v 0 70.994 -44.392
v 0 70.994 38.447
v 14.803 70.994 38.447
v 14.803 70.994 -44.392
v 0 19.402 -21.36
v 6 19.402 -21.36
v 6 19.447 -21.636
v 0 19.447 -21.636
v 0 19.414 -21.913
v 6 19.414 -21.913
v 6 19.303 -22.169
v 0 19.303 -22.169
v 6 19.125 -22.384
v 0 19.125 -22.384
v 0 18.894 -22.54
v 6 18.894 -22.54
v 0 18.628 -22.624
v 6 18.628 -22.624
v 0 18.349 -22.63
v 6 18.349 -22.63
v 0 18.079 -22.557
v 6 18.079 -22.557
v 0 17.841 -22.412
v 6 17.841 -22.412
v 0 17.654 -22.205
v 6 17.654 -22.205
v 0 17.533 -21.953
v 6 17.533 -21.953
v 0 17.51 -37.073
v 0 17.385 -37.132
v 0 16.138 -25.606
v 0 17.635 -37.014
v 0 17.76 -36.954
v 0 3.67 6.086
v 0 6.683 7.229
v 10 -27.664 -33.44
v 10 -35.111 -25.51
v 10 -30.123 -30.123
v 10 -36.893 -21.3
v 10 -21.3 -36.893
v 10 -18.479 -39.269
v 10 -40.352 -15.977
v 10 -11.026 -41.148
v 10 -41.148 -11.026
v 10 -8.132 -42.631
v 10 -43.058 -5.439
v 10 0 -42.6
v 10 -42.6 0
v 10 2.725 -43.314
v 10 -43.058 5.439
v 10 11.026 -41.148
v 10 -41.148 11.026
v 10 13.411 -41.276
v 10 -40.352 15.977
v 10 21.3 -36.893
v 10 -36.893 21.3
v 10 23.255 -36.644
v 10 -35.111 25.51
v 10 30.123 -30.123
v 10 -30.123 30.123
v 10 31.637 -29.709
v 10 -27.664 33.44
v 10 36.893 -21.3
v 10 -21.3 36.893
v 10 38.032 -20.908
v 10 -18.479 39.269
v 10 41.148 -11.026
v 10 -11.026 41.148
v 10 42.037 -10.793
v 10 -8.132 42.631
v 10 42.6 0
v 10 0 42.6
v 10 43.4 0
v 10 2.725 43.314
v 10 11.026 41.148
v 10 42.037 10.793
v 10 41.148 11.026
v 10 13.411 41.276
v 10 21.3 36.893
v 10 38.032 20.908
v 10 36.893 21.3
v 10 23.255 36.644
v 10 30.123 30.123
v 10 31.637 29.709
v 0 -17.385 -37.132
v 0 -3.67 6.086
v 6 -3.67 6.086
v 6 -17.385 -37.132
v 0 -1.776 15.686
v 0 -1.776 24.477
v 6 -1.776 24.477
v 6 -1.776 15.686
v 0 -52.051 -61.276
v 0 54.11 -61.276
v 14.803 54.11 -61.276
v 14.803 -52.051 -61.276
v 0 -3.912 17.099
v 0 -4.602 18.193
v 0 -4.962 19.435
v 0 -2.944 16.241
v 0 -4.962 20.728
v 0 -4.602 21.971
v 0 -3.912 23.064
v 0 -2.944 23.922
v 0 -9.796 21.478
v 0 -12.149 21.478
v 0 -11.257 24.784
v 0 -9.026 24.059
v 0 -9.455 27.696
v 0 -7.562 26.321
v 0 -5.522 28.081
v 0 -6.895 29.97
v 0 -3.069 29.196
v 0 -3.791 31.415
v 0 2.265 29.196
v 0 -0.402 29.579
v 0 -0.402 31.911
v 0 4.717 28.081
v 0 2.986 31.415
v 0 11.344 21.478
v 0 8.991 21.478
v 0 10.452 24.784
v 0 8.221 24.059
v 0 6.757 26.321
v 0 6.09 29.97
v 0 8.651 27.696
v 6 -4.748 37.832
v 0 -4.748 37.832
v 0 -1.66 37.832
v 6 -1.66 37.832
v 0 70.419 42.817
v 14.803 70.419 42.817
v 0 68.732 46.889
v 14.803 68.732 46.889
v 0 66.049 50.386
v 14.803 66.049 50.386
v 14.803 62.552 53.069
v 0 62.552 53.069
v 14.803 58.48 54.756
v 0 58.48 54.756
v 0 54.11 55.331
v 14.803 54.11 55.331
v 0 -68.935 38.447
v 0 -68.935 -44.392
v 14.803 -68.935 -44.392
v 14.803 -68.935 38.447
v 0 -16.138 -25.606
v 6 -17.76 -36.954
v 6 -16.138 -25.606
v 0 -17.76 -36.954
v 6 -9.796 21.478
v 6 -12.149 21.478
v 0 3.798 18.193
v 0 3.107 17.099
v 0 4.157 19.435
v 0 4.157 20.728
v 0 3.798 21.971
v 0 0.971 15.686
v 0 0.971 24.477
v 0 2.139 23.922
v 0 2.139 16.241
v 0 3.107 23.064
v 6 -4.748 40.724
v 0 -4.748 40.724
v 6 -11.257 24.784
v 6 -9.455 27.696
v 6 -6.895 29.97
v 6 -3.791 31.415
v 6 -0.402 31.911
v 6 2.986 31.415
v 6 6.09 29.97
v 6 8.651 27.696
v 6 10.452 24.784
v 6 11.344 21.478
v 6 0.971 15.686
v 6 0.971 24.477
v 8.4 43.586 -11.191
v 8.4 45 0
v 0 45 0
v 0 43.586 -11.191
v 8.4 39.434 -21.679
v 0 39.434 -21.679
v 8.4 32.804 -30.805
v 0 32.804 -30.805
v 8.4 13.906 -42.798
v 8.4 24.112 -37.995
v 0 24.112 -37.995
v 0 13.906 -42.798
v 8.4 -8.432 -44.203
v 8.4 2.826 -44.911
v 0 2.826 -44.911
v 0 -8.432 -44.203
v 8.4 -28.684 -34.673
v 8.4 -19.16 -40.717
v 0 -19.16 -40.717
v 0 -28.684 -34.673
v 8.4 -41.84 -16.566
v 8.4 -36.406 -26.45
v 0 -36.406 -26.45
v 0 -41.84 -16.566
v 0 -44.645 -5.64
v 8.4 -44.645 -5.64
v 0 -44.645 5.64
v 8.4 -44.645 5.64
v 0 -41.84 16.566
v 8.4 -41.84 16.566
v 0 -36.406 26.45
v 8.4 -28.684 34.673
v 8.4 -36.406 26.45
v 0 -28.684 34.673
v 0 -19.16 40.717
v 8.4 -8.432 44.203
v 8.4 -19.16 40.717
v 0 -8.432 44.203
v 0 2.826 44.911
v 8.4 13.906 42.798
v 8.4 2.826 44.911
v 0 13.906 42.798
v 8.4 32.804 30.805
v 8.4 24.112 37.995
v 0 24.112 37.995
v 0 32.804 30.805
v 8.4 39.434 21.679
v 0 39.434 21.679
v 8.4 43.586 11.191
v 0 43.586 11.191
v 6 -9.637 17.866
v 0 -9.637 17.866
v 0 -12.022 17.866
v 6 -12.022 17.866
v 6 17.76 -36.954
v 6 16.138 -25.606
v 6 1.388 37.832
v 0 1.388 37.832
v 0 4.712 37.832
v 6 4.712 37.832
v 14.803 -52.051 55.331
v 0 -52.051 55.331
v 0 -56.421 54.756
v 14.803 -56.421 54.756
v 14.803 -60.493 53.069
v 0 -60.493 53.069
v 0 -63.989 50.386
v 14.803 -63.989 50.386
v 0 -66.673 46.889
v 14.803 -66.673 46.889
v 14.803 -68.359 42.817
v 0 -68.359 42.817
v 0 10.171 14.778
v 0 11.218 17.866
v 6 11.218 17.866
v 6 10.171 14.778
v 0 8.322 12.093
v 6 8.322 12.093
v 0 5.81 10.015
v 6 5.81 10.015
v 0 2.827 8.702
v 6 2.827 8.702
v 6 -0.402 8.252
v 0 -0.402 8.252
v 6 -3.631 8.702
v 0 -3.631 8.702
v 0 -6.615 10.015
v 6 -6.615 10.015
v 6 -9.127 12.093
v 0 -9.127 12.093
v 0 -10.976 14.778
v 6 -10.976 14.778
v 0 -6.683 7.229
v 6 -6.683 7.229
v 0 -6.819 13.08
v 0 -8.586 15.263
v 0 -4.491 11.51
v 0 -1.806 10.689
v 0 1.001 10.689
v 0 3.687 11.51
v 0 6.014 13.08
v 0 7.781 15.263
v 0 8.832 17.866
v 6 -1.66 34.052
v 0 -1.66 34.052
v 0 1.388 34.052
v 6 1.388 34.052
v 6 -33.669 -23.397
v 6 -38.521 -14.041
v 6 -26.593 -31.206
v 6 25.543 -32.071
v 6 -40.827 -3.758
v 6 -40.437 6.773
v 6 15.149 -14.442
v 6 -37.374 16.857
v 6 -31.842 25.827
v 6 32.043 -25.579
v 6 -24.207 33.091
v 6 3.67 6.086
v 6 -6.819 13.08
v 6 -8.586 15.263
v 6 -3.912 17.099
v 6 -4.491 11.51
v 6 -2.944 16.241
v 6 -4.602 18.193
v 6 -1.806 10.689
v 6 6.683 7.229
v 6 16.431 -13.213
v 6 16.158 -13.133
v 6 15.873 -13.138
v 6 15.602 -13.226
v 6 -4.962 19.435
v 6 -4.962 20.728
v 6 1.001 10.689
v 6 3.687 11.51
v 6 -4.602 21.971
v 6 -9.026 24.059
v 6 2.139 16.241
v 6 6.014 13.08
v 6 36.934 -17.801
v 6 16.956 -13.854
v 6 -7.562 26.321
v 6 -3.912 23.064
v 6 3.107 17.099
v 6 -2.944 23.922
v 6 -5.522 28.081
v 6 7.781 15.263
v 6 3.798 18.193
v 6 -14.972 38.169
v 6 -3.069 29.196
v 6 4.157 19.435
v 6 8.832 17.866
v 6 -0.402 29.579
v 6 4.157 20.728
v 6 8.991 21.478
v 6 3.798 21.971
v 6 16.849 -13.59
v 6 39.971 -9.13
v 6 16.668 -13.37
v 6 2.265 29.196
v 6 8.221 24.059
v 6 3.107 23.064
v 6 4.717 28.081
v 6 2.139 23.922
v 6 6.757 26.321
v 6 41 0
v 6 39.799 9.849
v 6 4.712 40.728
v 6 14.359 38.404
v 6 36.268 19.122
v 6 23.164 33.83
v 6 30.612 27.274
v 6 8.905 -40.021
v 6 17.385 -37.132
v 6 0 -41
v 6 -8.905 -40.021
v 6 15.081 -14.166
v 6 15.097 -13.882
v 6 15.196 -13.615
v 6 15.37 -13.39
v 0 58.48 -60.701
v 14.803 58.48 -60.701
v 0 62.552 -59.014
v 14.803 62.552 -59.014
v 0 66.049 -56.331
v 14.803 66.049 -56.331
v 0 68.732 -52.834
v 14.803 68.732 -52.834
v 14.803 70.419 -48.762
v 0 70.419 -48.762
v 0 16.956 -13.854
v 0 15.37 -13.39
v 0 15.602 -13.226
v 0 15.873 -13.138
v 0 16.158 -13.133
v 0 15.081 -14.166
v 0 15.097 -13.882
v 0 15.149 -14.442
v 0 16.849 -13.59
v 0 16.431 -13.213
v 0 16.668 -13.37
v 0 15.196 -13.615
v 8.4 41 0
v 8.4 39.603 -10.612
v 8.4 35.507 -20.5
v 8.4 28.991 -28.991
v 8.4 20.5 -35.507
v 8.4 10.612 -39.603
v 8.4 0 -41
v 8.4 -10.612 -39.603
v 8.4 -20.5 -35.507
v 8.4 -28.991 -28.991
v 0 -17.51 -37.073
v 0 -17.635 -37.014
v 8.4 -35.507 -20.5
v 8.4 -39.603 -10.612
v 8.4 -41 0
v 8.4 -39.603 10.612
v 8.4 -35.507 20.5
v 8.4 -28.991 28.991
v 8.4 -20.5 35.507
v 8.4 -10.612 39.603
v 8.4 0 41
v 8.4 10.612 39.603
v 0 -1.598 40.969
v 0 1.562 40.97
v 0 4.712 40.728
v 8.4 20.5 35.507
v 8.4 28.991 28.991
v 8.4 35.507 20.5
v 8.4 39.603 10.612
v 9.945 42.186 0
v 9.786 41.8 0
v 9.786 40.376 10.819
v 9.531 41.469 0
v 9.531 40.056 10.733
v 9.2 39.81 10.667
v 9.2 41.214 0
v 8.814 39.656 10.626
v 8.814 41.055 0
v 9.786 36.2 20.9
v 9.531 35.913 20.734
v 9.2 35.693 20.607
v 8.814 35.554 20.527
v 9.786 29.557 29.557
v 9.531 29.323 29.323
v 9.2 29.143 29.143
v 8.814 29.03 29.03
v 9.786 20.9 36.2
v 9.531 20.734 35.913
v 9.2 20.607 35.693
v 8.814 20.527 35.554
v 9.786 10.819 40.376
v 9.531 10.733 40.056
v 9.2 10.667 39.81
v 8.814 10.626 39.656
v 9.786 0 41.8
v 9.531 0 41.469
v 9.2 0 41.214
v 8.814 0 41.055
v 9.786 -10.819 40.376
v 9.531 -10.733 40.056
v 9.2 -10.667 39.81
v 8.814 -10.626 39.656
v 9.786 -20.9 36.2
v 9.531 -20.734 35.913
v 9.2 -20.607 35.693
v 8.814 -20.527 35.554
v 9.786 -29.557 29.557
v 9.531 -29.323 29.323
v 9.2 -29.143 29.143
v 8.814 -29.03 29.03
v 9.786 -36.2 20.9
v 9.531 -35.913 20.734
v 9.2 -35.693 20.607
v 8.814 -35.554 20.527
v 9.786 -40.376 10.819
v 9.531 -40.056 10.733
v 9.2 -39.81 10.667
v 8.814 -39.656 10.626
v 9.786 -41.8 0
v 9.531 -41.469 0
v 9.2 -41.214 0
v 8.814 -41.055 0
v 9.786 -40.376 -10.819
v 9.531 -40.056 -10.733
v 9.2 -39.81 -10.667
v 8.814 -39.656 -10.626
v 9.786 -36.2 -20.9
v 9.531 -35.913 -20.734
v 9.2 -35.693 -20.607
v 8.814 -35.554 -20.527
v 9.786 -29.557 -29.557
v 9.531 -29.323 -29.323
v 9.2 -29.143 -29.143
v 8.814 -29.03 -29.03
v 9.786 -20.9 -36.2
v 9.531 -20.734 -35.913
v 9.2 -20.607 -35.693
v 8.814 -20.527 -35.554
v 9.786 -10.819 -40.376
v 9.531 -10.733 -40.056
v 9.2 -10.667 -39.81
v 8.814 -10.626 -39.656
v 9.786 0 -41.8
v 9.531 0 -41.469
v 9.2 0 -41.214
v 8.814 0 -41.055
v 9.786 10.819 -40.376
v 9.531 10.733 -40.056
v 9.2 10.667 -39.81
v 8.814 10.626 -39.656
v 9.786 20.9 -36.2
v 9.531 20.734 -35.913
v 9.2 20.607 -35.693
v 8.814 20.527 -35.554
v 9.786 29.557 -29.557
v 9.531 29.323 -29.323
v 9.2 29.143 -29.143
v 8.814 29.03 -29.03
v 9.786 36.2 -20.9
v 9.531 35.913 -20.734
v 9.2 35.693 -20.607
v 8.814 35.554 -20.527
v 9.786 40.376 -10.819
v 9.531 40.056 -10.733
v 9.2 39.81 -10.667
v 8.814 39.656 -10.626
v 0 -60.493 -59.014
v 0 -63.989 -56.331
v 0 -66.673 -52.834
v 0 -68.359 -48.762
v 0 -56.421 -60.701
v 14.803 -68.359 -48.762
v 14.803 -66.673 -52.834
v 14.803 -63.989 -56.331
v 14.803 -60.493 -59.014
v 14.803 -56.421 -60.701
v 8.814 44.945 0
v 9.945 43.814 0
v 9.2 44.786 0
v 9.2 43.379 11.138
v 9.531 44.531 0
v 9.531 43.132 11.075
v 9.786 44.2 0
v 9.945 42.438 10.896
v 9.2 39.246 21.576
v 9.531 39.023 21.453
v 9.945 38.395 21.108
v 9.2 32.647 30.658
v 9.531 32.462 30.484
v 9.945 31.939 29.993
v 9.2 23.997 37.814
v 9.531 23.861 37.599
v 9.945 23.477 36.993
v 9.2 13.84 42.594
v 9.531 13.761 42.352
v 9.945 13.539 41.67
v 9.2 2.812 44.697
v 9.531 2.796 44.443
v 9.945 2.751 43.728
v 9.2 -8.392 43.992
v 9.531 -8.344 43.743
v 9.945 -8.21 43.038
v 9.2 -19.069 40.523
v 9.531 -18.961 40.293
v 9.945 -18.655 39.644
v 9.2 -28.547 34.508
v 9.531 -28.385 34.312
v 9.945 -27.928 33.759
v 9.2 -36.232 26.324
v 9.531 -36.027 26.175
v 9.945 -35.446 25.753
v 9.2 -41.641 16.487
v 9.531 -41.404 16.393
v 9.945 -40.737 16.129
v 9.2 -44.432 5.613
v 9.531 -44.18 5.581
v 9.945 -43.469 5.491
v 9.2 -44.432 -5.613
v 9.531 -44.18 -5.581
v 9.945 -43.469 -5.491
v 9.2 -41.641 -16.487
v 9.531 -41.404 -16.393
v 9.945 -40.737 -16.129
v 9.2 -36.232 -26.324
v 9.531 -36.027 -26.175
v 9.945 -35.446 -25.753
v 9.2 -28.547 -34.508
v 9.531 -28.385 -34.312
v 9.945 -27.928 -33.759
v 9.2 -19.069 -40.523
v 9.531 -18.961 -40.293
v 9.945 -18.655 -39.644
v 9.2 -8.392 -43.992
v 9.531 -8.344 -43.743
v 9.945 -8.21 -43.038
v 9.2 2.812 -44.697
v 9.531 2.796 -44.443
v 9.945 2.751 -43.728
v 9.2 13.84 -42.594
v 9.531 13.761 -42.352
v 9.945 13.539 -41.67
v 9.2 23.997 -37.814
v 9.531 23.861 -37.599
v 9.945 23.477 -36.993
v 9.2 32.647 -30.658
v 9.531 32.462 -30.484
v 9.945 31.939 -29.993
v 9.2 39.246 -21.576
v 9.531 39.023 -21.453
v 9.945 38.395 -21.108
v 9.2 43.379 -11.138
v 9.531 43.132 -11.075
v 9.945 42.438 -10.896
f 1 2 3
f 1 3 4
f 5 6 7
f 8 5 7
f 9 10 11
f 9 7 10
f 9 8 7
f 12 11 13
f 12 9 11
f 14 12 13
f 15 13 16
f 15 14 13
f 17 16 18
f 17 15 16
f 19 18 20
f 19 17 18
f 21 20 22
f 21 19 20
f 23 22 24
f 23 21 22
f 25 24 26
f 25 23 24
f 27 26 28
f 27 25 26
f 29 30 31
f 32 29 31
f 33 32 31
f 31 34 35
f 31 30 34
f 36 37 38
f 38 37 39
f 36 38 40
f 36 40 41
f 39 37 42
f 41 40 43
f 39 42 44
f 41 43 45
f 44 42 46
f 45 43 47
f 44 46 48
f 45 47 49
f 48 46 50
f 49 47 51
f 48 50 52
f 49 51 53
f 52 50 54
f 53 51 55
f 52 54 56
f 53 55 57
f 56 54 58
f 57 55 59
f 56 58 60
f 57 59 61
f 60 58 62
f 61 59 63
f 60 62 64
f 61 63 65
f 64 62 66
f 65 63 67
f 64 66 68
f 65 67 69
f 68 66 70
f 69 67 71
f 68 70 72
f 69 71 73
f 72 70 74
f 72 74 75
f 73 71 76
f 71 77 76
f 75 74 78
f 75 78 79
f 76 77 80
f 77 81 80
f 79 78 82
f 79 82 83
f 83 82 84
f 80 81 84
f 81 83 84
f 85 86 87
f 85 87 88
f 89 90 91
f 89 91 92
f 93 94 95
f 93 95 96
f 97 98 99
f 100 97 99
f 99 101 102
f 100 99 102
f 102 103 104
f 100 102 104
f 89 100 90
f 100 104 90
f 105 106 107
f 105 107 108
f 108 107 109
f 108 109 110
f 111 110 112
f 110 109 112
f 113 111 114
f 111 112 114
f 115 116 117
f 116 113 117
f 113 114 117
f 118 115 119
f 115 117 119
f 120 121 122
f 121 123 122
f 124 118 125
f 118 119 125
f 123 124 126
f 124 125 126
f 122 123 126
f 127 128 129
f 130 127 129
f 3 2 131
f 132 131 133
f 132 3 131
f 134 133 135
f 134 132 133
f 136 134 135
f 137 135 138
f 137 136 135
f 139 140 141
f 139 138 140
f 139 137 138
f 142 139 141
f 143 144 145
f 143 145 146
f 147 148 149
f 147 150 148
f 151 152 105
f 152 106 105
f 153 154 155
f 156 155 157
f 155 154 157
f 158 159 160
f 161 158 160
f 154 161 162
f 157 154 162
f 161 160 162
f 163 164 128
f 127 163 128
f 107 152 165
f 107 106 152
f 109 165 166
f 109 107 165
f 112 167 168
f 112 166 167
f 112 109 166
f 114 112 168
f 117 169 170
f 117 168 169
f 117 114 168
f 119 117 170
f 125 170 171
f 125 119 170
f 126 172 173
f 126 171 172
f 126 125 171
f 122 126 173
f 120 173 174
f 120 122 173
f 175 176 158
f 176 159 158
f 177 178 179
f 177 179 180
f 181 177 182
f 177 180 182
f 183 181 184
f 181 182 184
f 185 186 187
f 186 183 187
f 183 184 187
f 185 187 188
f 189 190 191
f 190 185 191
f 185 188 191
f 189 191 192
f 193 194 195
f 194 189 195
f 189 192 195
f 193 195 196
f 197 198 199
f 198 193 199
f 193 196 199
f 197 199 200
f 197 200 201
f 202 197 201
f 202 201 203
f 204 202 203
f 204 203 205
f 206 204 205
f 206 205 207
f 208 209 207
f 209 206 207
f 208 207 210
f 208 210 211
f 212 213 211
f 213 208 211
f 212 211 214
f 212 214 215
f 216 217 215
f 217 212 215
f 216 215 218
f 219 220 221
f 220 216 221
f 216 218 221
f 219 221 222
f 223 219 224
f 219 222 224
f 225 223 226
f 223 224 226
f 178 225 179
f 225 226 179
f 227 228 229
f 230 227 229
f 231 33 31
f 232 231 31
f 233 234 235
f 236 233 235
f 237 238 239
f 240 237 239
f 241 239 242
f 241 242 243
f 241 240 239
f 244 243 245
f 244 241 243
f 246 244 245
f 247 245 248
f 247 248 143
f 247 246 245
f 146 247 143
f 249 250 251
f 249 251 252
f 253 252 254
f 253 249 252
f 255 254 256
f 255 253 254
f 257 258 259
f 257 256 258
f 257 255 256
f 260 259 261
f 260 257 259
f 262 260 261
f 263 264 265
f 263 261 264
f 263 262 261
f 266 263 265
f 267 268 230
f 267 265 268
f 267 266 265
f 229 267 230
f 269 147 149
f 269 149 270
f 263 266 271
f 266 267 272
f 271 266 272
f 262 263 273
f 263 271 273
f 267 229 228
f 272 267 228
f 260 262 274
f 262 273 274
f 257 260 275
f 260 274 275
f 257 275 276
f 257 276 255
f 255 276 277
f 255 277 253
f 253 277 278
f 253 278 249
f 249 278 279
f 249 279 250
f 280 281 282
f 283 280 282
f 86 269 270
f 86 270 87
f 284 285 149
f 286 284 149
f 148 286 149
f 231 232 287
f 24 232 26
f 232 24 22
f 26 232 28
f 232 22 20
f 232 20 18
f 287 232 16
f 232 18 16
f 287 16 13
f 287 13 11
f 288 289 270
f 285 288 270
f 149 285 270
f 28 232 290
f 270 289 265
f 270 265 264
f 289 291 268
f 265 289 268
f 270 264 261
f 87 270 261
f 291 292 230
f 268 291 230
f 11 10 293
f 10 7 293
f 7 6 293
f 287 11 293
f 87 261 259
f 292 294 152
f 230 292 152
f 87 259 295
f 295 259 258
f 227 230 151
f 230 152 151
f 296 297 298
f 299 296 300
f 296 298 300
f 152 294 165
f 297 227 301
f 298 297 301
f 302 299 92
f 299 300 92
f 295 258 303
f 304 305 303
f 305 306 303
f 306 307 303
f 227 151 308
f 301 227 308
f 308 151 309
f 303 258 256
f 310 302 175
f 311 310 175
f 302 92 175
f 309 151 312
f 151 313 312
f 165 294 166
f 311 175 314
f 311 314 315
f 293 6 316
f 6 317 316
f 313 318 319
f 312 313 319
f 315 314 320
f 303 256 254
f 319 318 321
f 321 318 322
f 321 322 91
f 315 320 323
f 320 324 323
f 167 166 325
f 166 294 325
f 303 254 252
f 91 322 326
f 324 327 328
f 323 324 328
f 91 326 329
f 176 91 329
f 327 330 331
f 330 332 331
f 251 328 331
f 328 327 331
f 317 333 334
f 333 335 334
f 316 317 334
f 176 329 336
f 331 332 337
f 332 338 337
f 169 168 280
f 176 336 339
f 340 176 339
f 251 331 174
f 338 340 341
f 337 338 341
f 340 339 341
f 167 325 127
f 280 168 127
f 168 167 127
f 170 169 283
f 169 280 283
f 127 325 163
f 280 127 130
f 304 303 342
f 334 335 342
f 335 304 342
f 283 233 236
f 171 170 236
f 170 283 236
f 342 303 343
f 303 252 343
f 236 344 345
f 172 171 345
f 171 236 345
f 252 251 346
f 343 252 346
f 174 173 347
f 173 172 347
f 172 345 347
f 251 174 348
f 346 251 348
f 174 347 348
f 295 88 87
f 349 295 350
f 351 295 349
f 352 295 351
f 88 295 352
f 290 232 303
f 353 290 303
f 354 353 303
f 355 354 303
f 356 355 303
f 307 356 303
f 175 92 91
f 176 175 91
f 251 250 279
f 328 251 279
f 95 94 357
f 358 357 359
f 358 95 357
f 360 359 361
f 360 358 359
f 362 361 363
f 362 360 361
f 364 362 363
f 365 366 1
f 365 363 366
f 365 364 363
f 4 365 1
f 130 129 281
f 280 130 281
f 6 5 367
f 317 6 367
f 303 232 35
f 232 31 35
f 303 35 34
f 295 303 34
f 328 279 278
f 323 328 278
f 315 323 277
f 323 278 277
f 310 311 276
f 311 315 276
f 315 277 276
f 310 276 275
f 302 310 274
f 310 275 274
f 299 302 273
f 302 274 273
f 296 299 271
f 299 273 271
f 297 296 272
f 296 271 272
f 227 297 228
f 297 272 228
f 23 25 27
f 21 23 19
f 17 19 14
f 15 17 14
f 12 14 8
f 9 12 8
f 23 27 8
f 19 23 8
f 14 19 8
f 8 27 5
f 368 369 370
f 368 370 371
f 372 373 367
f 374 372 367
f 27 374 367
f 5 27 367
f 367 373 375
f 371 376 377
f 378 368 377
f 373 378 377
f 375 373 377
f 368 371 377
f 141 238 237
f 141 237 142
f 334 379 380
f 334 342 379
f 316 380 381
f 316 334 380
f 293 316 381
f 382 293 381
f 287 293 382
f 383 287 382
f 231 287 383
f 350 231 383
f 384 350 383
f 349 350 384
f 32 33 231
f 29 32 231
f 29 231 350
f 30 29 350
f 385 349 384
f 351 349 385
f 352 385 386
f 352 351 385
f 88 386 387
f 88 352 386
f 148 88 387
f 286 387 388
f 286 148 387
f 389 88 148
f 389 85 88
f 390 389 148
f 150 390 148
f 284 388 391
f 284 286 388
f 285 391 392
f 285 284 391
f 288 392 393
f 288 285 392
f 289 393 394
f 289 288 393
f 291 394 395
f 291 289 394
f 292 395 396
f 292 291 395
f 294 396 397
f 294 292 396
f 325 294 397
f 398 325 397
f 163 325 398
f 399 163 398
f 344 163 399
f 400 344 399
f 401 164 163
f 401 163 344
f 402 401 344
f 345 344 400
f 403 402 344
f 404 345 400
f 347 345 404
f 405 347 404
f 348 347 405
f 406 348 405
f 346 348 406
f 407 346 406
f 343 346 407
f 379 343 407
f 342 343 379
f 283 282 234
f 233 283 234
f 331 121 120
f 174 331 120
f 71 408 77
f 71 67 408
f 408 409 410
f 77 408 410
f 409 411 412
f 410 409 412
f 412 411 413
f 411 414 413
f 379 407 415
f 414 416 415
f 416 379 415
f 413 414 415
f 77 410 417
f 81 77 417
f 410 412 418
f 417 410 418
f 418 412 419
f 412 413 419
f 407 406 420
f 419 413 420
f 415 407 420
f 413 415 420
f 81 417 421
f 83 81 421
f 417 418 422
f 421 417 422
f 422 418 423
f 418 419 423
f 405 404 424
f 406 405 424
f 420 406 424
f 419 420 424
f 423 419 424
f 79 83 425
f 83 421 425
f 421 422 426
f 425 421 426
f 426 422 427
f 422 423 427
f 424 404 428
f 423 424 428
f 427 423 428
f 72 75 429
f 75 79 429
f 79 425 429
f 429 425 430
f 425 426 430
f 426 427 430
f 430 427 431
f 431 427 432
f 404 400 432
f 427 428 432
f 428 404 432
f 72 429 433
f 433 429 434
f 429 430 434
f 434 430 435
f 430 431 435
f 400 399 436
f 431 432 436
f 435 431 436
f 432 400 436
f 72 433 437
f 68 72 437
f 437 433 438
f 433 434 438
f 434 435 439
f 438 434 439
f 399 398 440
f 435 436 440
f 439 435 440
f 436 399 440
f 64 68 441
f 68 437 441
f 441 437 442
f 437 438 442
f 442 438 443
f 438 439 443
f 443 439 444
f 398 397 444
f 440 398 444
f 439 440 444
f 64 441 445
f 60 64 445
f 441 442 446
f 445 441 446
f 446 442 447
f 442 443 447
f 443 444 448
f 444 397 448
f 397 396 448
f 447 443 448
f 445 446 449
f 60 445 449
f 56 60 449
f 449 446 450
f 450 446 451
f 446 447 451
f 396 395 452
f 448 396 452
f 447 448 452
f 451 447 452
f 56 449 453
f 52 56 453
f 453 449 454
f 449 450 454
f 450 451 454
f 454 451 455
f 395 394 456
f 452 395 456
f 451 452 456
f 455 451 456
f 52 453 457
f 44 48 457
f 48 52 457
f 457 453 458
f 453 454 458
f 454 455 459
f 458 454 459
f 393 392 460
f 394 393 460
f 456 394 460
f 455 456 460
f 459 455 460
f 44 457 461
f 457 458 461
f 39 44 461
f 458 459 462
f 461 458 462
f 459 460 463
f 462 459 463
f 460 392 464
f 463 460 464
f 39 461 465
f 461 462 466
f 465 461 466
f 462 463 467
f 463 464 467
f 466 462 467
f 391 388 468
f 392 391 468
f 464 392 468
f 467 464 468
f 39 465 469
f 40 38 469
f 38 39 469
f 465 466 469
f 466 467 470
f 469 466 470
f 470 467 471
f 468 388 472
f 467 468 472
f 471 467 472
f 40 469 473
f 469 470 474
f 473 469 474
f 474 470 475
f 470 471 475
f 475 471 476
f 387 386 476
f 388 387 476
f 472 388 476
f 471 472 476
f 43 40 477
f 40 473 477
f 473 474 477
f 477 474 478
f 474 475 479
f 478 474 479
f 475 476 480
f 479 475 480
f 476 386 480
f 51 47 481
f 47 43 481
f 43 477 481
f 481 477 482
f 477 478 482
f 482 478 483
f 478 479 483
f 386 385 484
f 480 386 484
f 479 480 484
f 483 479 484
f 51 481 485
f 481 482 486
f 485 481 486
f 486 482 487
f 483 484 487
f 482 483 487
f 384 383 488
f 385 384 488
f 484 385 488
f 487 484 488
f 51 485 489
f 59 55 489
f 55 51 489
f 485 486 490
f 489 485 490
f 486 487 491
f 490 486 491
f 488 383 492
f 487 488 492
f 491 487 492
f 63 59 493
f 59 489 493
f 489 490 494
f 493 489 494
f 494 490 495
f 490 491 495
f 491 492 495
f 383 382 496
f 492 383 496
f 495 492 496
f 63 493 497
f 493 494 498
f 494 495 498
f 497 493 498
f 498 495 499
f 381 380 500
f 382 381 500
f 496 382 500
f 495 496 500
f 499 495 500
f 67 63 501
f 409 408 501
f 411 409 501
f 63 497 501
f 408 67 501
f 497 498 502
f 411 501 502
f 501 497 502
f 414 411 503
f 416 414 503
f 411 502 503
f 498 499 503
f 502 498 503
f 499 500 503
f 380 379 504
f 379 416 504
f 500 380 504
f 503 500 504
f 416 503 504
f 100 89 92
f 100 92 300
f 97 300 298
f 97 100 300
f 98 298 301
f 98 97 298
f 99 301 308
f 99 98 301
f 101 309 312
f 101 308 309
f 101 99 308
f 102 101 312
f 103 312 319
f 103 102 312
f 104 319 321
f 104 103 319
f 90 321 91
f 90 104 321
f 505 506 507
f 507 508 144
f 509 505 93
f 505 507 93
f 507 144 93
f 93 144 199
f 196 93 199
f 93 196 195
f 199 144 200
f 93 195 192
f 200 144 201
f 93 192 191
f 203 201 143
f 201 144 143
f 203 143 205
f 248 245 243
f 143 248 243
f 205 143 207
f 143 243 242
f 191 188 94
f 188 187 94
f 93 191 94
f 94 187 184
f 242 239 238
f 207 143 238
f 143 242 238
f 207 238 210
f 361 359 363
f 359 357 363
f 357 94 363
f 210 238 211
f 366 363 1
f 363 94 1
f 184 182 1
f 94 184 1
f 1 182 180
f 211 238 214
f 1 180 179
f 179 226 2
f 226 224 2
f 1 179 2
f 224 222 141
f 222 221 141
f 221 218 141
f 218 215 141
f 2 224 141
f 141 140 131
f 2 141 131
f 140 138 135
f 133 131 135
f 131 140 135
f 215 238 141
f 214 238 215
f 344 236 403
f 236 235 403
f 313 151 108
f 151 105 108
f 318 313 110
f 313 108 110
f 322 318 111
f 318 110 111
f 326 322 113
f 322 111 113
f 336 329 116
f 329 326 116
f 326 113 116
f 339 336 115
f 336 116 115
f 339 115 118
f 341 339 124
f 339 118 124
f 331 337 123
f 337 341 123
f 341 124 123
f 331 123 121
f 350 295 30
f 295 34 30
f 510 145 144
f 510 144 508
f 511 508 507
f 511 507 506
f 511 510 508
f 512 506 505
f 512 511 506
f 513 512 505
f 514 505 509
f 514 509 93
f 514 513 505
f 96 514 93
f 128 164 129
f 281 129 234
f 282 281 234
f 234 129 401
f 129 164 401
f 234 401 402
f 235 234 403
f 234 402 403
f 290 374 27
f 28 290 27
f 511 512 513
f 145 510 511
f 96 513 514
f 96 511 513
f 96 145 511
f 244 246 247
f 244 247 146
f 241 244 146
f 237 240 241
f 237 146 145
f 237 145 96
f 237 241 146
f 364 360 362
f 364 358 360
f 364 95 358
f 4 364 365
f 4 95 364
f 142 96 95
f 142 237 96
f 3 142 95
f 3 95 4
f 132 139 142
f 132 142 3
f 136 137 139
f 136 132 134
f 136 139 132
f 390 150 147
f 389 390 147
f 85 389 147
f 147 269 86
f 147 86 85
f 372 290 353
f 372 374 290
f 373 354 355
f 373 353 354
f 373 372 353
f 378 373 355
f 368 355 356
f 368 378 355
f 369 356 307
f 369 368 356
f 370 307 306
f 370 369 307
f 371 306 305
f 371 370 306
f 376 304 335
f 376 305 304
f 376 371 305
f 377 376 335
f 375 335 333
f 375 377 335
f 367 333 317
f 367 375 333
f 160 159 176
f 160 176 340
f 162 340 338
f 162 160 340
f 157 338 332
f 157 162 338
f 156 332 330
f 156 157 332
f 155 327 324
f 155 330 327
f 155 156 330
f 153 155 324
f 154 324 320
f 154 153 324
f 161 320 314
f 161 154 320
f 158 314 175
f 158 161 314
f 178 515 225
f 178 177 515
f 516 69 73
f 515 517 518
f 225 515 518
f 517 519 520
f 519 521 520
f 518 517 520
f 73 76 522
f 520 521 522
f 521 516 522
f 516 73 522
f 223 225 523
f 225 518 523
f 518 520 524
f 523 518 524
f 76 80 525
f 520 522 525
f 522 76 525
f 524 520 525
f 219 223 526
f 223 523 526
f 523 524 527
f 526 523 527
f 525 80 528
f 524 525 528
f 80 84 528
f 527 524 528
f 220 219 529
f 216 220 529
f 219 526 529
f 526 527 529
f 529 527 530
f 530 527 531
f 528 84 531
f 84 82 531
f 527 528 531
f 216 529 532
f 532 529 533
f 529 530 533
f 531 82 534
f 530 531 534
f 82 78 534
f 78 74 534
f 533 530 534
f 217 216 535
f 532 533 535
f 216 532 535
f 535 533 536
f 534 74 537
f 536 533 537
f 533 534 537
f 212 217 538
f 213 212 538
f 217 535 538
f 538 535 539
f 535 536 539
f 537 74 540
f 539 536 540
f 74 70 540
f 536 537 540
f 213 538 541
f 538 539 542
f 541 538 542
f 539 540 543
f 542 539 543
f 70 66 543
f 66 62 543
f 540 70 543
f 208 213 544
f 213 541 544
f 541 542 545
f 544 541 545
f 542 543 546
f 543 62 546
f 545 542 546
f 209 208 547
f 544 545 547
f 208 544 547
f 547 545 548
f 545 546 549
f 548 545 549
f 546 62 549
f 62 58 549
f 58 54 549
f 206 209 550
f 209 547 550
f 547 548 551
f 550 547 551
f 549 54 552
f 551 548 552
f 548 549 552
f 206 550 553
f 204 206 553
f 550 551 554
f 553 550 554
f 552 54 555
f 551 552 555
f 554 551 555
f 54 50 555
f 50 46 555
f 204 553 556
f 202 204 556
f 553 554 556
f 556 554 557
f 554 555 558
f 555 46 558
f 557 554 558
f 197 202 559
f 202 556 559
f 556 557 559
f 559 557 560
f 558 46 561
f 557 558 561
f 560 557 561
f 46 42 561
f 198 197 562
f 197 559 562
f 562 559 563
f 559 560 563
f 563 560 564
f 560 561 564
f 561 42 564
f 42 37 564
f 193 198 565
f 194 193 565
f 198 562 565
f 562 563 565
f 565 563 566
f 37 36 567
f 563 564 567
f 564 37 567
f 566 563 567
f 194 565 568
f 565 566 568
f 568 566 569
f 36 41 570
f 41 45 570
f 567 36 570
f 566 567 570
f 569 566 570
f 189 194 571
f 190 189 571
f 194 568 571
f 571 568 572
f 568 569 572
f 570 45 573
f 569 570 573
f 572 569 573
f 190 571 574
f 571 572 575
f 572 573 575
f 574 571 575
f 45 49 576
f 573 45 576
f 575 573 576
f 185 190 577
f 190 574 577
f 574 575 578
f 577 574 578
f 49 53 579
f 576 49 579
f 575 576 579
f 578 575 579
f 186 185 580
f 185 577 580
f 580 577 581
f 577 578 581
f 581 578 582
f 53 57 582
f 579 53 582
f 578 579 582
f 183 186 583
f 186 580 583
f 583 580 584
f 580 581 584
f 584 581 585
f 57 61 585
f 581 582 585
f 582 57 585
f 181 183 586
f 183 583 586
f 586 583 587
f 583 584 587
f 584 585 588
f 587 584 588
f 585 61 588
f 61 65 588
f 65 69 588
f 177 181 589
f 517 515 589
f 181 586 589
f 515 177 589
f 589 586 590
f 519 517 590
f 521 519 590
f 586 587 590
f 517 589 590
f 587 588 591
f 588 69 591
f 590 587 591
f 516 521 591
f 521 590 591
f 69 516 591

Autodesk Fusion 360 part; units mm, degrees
sketch "Sketch1" plane through (0, 0, 0) normal (1, 0, 0) x (0, 1, 0)
  circle A0 centre (0, 0) radius 45
  line L0 (-1.7761, 24.4773) -> (-1.7761, 15.686)
  line L1 (0.9712, 24.4773) -> (0.9712, 15.686)
  line L2 (-4.7479, 40.7242) -> (-4.7479, 37.8324)
  line L3 (-4.7479, 37.8324) -> (-1.6597, 37.8324)
  line L4 (-1.6597, 37.8324) -> (-1.6597, 34.0517)
  line L5 (-1.6597, 34.0517) -> (1.3885, 34.0517)
  line L6 (1.3885, 34.0517) -> (1.3885, 37.8324)
  line L7 (1.3885, 37.8324) -> (4.7125, 37.8324)
  line L8 (4.7125, 37.8324) -> (4.7125, 40.7283)
  line L9 (-6.6829, 7.2287) -> (-3.6696, 6.0858)
  line L10 (-3.6696, 6.0858) -> (-17.3847, -37.1318)
  line L11 (-17.7596, -36.954) -> (-16.1385, -25.606)
  line L12 (-16.1385, -25.606) -> (-6.6829, 7.2287)
  line L13 (0, 0) -> (0, -12.4098) construction
  line L14 (16.1385, -25.606) -> (6.6829, 7.2287)
  line L15 (3.6696, 6.0858) -> (17.3847, -37.1318)
  line L16 (6.6829, 7.2287) -> (3.6696, 6.0858)
  line L17 (17.7596, -36.954) -> (16.1385, -25.606)
  line L18 (15.1489, -14.4423) -> (17.5326, -21.9534)
  line L19 (19.4017, -21.3603) -> (16.9104, -13.7134)
  arc A1 (16.9561, -13.8536) -> (15.1489, -14.4423) centre (16.0297, -14.0779) ccw
  arc A2 (17.5326, -21.9534) -> (19.397, -21.346) centre (18.4671, -21.6568) ccw
  arc A3 (-9.6373, 17.866) -> (8.8324, 17.866) centre (-0.4024, 20.0816) ccw
  arc A4 (8.9914, 21.4775) -> (-9.7962, 21.4775) centre (-0.4024, 20.0816) ccw
  arc A5 (-12.0223, 17.866) -> (11.2175, 17.866) centre (-0.4024, 20.0816) ccw
  arc A6 (11.3442, 21.4775) -> (-12.149, 21.4775) centre (-0.4024, 20.0816) ccw
  line L20 (-12.149, 21.4775) -> (-9.7962, 21.4775)
  line L21 (-9.6373, 17.866) -> (-12.0223, 17.866)
  line L22 (11.2175, 17.866) -> (8.8324, 17.866)
  line L23 (8.9914, 21.4775) -> (11.3442, 21.4775)
  arc A7 (-1.7761, 24.4773) -> (-1.7761, 15.686) centre (-0.4024, 20.0816) ccw
  arc A8 (0.9712, 15.686) -> (0.9712, 24.4773) centre (-0.4024, 20.0816) ccw
  circle A9 centre (0, 0) radius 41
  dimension "d1" = 90
  dimension "d2" = 82
extrude "Extrude1" add sketch "Sketch1" along normal blind 10 contours A0 makes body 1
extrude "Extrude2" add sketch "Sketch1" along normal blind 6 contours L2 L3 L4 L5 L6 L7 L8 L9 L10 L11 L12 L14 L15 L16 L17 A9 bodies 1
fillet "Fillet1" radius 1.6 2 edges at (10, -38.2254, 14.8262) (10, -41.9547, -16.2727) on bodies 1
sketch "Sketch2" plane through (0, 0, 0) normal (1, 0, 0) x (0, 1, 0)
  line L0 (-68.9346, 55.3313) -> (70.9942, 55.3313)
  line L1 (70.9942, 55.3313) -> (70.9942, -61.2761)
  line L2 (70.9942, -61.2761) -> (-68.9346, -61.2761)
  line L3 (-68.9346, -61.2761) -> (-68.9346, 55.3313)
extrude "Extrude3" add sketch "Sketch2" along normal blind 14.803 separate body makes body 2
combine "Combine1" operation cut target body 2 tool bodies 1
fillet "Fillet2" radius 16.884 4 edges at (7.4015, 70.9942, -61.2761) (7.4015, 70.9942, 55.3313) (7.4015, -68.9346, -61.2761) (7.4015, -68.9346, 55.3313) on bodies 2
